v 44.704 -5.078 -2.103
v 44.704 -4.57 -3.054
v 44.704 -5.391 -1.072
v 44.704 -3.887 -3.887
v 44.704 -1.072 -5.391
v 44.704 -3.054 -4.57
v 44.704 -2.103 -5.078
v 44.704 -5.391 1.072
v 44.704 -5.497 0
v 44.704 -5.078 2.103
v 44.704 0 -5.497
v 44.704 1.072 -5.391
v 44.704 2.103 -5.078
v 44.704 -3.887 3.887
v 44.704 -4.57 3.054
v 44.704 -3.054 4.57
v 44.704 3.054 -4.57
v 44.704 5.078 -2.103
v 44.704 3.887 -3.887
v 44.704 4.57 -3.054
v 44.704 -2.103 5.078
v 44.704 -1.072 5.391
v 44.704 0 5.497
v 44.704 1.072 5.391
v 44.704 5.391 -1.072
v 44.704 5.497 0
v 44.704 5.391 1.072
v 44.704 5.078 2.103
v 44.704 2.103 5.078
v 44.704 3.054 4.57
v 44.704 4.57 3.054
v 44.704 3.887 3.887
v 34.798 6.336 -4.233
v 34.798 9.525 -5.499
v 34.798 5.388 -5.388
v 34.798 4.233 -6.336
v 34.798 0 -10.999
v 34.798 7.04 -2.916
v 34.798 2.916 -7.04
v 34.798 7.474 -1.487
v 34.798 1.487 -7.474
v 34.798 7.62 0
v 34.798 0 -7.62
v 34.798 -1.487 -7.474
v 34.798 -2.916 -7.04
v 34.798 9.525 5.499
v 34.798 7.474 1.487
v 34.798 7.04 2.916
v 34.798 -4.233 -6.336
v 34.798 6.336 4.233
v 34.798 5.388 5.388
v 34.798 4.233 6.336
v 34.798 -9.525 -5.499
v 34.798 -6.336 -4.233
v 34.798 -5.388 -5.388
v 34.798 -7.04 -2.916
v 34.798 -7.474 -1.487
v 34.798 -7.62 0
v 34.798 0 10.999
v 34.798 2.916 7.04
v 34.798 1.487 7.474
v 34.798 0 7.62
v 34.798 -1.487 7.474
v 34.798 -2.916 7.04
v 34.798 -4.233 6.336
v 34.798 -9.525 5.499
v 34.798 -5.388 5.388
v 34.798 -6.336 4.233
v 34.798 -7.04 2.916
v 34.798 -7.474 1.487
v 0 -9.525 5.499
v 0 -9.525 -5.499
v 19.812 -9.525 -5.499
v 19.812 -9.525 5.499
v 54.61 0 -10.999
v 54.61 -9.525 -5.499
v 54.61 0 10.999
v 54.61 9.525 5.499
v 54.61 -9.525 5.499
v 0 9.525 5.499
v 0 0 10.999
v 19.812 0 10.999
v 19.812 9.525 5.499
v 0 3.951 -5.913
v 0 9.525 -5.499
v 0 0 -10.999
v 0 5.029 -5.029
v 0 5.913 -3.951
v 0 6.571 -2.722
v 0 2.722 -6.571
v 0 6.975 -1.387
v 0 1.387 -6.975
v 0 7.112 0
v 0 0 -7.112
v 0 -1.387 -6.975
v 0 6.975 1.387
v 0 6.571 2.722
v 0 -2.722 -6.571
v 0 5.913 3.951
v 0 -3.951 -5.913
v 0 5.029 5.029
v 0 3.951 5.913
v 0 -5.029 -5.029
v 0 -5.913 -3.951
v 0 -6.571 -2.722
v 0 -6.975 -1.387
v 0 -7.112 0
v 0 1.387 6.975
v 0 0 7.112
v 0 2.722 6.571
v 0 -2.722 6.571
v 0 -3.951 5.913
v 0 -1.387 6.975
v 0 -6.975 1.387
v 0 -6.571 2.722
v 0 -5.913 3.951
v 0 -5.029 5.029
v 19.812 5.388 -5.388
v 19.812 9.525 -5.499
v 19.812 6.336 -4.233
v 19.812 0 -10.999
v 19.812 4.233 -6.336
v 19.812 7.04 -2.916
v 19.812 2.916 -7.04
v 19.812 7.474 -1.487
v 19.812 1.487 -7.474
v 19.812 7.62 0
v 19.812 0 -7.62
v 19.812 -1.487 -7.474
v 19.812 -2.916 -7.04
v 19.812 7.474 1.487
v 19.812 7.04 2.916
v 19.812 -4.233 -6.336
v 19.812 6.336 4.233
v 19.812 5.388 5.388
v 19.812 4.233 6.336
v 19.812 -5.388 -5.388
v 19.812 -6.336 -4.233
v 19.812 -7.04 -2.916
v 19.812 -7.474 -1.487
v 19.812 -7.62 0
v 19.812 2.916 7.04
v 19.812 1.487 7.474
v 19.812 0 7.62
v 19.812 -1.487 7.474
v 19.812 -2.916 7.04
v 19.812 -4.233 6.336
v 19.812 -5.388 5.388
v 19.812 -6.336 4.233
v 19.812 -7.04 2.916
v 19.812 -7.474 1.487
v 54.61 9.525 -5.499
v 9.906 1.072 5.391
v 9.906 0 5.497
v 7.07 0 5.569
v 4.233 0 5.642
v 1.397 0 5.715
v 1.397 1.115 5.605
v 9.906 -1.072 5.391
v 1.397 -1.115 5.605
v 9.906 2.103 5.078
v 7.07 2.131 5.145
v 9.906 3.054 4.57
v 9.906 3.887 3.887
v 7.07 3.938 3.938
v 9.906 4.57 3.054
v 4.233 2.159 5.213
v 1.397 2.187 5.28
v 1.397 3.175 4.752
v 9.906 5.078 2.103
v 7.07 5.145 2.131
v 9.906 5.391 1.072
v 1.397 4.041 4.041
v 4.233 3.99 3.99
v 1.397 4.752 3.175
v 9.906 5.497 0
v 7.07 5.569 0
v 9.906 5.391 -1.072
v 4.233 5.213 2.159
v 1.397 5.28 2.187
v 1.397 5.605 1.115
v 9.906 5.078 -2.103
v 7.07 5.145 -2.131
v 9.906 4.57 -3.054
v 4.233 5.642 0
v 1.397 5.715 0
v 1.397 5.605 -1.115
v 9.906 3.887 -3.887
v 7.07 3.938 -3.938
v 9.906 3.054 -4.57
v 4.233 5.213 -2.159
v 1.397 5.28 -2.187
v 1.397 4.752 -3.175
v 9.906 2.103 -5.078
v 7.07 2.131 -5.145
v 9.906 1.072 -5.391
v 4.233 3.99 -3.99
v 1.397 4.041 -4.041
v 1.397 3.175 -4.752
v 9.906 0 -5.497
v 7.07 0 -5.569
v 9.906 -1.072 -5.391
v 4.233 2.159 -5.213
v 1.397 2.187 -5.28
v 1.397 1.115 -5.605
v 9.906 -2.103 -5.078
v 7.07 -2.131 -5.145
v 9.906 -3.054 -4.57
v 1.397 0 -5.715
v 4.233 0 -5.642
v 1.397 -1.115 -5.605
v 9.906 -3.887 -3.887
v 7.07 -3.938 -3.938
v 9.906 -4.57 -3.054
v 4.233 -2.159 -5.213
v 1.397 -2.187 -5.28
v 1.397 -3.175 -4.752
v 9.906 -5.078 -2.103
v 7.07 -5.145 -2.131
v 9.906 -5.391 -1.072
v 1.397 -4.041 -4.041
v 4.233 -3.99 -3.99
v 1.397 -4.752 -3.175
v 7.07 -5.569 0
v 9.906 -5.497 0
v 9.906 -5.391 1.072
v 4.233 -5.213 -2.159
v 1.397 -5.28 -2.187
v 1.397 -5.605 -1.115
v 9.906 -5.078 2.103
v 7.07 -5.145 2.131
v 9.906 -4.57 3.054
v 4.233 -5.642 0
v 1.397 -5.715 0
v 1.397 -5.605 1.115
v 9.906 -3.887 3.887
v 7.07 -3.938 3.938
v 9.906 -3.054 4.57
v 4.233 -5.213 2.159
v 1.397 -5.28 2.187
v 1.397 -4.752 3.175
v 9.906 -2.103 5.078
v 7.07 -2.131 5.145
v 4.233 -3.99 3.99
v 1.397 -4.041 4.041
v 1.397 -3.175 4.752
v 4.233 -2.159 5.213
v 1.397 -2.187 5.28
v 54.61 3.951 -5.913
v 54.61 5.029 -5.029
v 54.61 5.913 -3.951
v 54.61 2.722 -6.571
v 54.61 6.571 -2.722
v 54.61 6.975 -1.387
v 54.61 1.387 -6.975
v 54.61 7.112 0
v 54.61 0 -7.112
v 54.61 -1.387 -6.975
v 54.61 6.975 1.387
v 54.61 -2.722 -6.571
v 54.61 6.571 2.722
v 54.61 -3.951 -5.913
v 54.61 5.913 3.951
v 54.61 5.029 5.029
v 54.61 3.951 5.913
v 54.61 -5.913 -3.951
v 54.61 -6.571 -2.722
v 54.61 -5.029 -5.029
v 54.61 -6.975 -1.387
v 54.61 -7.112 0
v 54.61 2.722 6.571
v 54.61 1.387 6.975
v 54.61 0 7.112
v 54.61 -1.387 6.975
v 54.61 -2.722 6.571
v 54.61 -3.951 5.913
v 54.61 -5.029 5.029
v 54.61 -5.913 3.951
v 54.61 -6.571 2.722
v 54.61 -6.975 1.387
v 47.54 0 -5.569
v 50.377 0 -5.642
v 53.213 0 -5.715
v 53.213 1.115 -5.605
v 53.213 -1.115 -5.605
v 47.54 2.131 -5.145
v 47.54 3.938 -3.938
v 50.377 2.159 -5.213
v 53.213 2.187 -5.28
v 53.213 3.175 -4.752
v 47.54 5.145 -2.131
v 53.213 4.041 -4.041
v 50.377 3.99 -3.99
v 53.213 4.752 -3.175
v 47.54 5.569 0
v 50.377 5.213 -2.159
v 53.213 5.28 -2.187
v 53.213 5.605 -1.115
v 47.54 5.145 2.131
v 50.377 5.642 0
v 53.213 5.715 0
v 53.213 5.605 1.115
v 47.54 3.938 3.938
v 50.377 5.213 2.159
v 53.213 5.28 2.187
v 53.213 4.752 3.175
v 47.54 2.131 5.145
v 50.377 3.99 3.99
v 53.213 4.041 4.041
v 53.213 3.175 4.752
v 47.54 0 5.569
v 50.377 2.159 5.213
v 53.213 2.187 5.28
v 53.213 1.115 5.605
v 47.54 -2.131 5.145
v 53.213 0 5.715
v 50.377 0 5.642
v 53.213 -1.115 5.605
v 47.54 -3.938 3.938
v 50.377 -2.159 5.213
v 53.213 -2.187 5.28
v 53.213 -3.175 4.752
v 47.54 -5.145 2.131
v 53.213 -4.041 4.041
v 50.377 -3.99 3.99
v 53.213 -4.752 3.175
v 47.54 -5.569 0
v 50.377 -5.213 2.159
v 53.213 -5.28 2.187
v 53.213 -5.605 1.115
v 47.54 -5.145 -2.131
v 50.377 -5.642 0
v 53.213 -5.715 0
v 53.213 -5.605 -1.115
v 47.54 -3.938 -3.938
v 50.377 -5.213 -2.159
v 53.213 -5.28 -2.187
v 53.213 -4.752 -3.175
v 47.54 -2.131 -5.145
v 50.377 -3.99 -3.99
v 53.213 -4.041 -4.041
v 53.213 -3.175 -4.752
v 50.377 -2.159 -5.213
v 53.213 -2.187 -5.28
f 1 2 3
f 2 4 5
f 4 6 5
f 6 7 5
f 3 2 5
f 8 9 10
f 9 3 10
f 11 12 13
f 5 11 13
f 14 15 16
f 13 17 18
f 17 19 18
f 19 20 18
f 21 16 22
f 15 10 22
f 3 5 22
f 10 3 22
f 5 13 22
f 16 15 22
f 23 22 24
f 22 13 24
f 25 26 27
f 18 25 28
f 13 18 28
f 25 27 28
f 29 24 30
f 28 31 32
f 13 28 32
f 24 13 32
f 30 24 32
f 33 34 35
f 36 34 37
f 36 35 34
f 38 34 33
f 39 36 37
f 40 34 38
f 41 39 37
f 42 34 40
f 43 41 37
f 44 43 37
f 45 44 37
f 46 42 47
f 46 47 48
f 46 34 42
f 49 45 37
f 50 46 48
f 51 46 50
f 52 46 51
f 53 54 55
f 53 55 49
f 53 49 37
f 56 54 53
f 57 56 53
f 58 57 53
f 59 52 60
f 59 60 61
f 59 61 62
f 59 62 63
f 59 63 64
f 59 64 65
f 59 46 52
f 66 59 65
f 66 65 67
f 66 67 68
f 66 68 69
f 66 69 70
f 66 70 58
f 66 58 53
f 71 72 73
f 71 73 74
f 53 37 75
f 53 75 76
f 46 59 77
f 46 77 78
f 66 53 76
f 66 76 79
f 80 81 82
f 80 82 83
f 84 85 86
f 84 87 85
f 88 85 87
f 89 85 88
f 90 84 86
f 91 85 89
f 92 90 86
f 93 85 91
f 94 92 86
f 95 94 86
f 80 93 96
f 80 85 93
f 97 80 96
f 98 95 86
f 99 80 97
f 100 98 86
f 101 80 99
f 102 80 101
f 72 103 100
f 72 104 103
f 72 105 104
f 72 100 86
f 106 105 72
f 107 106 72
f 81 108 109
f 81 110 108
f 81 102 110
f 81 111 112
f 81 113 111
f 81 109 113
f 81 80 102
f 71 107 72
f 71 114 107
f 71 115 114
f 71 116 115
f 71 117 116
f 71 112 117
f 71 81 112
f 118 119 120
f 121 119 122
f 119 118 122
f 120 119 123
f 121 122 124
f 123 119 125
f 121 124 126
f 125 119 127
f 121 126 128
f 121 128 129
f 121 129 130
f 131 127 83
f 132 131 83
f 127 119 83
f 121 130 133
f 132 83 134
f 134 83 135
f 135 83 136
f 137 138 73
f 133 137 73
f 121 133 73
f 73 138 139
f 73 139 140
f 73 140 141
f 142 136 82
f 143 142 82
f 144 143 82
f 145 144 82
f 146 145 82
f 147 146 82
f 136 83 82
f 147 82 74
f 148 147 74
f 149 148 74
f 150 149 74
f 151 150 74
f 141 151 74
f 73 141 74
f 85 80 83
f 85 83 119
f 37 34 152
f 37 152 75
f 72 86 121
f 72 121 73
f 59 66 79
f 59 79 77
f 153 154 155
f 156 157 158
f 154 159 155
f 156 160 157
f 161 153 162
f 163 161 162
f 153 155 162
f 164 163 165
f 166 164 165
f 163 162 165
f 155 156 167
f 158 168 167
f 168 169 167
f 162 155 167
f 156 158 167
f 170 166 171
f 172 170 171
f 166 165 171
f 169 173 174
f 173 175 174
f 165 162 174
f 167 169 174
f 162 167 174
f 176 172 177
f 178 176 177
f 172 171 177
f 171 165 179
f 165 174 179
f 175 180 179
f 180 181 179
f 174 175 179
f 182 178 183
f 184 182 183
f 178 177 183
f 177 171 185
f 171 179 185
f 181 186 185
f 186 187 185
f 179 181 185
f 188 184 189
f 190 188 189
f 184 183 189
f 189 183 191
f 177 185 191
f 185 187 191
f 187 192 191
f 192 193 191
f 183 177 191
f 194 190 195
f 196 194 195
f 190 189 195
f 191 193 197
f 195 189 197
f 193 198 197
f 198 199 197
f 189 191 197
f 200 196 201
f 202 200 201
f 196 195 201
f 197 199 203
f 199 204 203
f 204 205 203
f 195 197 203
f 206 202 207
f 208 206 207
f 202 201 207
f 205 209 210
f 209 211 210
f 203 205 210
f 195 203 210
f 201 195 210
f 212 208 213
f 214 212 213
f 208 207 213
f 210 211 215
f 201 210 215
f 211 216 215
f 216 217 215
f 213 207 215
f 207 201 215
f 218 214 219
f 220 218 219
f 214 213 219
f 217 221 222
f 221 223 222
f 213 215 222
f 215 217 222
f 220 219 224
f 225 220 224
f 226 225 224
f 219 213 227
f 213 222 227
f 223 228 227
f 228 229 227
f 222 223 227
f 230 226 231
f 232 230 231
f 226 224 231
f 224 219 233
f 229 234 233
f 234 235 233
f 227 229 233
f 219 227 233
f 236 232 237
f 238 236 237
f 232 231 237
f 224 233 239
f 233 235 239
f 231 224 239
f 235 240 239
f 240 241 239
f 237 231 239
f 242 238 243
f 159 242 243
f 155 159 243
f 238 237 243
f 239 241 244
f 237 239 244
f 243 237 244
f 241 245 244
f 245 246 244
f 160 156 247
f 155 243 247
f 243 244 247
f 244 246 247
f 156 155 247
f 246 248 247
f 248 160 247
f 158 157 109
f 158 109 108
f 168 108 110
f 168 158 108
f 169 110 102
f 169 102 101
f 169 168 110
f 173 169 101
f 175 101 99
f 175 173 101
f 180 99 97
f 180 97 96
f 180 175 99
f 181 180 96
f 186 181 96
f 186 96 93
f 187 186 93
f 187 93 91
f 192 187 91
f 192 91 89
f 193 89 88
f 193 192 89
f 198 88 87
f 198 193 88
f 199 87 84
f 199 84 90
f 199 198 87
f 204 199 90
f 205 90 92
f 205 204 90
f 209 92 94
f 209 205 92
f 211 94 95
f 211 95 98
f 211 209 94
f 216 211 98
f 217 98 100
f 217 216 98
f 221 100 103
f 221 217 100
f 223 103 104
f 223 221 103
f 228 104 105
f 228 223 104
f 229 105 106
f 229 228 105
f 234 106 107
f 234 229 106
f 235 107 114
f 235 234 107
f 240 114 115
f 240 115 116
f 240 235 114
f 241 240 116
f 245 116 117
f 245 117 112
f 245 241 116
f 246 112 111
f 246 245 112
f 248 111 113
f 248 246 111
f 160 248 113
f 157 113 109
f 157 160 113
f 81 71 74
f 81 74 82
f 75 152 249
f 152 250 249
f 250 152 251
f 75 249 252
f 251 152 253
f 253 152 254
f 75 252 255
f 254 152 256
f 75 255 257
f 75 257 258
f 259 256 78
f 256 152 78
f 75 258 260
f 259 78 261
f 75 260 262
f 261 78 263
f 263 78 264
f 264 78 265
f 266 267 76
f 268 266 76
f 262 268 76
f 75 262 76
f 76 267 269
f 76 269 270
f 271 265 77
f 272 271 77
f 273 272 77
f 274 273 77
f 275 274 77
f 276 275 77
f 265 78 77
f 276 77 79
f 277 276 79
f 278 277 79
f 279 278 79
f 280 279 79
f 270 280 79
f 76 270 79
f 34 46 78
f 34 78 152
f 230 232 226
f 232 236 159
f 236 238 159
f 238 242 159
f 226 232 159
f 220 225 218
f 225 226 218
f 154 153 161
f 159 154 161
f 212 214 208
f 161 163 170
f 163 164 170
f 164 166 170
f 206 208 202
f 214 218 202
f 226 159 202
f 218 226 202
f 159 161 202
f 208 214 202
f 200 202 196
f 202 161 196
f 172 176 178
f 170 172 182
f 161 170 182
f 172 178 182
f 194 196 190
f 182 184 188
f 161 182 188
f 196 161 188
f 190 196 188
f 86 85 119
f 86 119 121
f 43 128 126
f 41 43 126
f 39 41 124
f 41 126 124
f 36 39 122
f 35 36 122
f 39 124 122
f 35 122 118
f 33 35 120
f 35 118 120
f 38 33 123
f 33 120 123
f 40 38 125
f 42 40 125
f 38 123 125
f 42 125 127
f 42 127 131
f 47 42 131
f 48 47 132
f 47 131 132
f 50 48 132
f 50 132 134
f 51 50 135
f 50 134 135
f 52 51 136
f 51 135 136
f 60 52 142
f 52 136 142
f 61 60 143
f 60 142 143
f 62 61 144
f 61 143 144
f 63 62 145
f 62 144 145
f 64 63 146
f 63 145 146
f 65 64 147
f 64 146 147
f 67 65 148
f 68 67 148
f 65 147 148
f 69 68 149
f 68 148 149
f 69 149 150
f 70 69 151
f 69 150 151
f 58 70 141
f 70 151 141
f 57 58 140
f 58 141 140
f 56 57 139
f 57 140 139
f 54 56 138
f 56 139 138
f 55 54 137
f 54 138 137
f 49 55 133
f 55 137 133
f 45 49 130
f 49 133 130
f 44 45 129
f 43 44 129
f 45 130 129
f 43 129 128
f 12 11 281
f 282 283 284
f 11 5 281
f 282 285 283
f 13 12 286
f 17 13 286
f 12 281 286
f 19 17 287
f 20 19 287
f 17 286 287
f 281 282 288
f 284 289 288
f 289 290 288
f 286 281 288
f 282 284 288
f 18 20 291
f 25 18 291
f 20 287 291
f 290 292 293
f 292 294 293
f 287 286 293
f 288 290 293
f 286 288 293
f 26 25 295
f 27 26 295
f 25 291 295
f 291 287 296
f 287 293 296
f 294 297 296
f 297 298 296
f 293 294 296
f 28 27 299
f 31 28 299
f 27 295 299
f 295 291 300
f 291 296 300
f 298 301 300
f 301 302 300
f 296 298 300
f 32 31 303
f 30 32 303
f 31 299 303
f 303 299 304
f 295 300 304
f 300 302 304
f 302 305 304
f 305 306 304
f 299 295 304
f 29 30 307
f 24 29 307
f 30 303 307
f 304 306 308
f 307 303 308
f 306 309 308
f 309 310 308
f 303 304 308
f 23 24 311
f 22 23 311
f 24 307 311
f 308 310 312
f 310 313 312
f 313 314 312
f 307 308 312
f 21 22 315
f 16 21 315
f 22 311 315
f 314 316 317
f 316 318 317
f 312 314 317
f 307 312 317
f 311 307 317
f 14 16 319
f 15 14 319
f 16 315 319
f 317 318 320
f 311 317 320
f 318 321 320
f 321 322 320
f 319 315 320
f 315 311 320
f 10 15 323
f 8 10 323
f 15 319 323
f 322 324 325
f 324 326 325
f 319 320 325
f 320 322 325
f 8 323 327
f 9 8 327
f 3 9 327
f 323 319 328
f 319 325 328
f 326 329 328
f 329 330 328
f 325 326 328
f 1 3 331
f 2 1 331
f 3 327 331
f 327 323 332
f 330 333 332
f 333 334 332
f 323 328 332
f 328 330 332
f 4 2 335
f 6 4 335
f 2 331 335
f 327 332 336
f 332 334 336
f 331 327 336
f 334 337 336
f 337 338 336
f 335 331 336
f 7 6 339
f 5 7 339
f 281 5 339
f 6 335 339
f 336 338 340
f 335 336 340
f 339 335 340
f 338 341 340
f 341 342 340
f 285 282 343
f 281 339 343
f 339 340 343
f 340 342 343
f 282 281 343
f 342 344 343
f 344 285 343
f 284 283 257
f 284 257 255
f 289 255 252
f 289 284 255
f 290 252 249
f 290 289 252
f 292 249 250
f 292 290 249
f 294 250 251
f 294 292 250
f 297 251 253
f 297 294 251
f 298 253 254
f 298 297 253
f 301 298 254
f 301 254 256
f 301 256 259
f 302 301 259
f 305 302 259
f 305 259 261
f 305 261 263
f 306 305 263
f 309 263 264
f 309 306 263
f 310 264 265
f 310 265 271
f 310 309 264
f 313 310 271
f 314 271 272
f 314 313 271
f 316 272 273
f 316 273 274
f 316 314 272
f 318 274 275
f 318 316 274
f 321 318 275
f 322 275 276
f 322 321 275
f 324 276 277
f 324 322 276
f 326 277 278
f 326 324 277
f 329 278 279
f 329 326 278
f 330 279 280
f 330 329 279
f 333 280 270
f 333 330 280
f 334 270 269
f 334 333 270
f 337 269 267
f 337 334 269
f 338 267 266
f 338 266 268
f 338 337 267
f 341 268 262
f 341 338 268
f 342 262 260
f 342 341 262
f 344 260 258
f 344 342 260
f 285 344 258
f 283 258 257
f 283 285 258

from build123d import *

# Parameters (mm, degrees)
BOSS_EXTRUDE1_DEPTH   = 19.812
SKETCH2_R             = 7.62
BOSS_EXTRUDE2_DEPTH   = 14.986
BOSS_EXTRUDE3_DEPTH   = 19.812
CHAMFER1_SIZE2        = 1.397459912
CHAMFER1_SIZE         = 1.361150227
CHAMFER1_EDGE_2_SIZE2 = 1.397459912
CHAMFER1_EDGE_2_SIZE  = 1.361150227


with BuildPart() as part:
    # Sketch1 → Boss-Extrude1 (new body)
    with BuildSketch(Plane(origin=(0, 0, 0), x_dir=(0, -1, 0), z_dir=(-1, 0, 0))):
        Polygon((-9.525, 5.499261314), (-9.525, -5.499261314), (0, -10.998522628), (9.525, -5.499261314), (9.525, 5.499261314), (0, 10.998522628), align=None)
    extrude(amount=-BOSS_EXTRUDE1_DEPTH)

    # Sketch2 → Boss-Extrude2 (add)
    with BuildSketch(Plane(origin=(19.812, 0, 0), x_dir=(0, 0, -1), z_dir=(1, 0, 0))):
        Circle(SKETCH2_R)
    extrude(amount=BOSS_EXTRUDE2_DEPTH)

    # Sketch3 → Boss-Extrude3 (add)
    with BuildSketch(Plane(origin=(34.798, 0, 0), x_dir=(0, -1, 0), z_dir=(-1, 0, 0))):
        Polygon((9.525, -5.499261314), (9.525, 5.499261314), (0, 10.998522628), (-9.525, 5.499261314), (-9.525, -5.499261314), (0, -10.998522628), align=None)
    extrude(amount=-BOSS_EXTRUDE3_DEPTH)

    # Sketch4 → Hole1 (revolve, cut)
    with BuildSketch(Plane(origin=(54.61, 0, 0), x_dir=(0, 0, -1), z_dir=(0, 1, 0))):
        Polygon((0, 0), (0, 9.906), (5.49664229, 9.906), (5.750849773, 0), align=None)
    revolve(axis=Axis((-55.39, 0, 0), (1, 0, 0)), mode=Mode.SUBTRACT)

    # Sketch6 → Hole2 (revolve, cut)
    with BuildSketch(Plane.ZX):
        Polygon((0, 0), (0, 9.906), (5.49664229, 9.906), (5.750849773, 0), align=None)
    revolve(axis=Axis((110, 0, 0), (-1, 0, 0)), mode=Mode.SUBTRACT)

    # Chamfer1
    chamfer1_edges = [part.edges().sort_by_distance(p)[0] for p in [
        (54.61, 0, 5.750849773),
    ]]
    chamfer(chamfer1_edges, length=CHAMFER1_SIZE, length2=CHAMFER1_SIZE2)

    # Chamfer1 edge 2
    chamfer1_edge_2_edges = [part.edges().sort_by_distance(p)[0] for p in [
        (0, 0, -5.750849773),
    ]]
    chamfer(chamfer1_edge_2_edges, length=CHAMFER1_EDGE_2_SIZE, length2=CHAMFER1_EDGE_2_SIZE2)


solid = part.part
